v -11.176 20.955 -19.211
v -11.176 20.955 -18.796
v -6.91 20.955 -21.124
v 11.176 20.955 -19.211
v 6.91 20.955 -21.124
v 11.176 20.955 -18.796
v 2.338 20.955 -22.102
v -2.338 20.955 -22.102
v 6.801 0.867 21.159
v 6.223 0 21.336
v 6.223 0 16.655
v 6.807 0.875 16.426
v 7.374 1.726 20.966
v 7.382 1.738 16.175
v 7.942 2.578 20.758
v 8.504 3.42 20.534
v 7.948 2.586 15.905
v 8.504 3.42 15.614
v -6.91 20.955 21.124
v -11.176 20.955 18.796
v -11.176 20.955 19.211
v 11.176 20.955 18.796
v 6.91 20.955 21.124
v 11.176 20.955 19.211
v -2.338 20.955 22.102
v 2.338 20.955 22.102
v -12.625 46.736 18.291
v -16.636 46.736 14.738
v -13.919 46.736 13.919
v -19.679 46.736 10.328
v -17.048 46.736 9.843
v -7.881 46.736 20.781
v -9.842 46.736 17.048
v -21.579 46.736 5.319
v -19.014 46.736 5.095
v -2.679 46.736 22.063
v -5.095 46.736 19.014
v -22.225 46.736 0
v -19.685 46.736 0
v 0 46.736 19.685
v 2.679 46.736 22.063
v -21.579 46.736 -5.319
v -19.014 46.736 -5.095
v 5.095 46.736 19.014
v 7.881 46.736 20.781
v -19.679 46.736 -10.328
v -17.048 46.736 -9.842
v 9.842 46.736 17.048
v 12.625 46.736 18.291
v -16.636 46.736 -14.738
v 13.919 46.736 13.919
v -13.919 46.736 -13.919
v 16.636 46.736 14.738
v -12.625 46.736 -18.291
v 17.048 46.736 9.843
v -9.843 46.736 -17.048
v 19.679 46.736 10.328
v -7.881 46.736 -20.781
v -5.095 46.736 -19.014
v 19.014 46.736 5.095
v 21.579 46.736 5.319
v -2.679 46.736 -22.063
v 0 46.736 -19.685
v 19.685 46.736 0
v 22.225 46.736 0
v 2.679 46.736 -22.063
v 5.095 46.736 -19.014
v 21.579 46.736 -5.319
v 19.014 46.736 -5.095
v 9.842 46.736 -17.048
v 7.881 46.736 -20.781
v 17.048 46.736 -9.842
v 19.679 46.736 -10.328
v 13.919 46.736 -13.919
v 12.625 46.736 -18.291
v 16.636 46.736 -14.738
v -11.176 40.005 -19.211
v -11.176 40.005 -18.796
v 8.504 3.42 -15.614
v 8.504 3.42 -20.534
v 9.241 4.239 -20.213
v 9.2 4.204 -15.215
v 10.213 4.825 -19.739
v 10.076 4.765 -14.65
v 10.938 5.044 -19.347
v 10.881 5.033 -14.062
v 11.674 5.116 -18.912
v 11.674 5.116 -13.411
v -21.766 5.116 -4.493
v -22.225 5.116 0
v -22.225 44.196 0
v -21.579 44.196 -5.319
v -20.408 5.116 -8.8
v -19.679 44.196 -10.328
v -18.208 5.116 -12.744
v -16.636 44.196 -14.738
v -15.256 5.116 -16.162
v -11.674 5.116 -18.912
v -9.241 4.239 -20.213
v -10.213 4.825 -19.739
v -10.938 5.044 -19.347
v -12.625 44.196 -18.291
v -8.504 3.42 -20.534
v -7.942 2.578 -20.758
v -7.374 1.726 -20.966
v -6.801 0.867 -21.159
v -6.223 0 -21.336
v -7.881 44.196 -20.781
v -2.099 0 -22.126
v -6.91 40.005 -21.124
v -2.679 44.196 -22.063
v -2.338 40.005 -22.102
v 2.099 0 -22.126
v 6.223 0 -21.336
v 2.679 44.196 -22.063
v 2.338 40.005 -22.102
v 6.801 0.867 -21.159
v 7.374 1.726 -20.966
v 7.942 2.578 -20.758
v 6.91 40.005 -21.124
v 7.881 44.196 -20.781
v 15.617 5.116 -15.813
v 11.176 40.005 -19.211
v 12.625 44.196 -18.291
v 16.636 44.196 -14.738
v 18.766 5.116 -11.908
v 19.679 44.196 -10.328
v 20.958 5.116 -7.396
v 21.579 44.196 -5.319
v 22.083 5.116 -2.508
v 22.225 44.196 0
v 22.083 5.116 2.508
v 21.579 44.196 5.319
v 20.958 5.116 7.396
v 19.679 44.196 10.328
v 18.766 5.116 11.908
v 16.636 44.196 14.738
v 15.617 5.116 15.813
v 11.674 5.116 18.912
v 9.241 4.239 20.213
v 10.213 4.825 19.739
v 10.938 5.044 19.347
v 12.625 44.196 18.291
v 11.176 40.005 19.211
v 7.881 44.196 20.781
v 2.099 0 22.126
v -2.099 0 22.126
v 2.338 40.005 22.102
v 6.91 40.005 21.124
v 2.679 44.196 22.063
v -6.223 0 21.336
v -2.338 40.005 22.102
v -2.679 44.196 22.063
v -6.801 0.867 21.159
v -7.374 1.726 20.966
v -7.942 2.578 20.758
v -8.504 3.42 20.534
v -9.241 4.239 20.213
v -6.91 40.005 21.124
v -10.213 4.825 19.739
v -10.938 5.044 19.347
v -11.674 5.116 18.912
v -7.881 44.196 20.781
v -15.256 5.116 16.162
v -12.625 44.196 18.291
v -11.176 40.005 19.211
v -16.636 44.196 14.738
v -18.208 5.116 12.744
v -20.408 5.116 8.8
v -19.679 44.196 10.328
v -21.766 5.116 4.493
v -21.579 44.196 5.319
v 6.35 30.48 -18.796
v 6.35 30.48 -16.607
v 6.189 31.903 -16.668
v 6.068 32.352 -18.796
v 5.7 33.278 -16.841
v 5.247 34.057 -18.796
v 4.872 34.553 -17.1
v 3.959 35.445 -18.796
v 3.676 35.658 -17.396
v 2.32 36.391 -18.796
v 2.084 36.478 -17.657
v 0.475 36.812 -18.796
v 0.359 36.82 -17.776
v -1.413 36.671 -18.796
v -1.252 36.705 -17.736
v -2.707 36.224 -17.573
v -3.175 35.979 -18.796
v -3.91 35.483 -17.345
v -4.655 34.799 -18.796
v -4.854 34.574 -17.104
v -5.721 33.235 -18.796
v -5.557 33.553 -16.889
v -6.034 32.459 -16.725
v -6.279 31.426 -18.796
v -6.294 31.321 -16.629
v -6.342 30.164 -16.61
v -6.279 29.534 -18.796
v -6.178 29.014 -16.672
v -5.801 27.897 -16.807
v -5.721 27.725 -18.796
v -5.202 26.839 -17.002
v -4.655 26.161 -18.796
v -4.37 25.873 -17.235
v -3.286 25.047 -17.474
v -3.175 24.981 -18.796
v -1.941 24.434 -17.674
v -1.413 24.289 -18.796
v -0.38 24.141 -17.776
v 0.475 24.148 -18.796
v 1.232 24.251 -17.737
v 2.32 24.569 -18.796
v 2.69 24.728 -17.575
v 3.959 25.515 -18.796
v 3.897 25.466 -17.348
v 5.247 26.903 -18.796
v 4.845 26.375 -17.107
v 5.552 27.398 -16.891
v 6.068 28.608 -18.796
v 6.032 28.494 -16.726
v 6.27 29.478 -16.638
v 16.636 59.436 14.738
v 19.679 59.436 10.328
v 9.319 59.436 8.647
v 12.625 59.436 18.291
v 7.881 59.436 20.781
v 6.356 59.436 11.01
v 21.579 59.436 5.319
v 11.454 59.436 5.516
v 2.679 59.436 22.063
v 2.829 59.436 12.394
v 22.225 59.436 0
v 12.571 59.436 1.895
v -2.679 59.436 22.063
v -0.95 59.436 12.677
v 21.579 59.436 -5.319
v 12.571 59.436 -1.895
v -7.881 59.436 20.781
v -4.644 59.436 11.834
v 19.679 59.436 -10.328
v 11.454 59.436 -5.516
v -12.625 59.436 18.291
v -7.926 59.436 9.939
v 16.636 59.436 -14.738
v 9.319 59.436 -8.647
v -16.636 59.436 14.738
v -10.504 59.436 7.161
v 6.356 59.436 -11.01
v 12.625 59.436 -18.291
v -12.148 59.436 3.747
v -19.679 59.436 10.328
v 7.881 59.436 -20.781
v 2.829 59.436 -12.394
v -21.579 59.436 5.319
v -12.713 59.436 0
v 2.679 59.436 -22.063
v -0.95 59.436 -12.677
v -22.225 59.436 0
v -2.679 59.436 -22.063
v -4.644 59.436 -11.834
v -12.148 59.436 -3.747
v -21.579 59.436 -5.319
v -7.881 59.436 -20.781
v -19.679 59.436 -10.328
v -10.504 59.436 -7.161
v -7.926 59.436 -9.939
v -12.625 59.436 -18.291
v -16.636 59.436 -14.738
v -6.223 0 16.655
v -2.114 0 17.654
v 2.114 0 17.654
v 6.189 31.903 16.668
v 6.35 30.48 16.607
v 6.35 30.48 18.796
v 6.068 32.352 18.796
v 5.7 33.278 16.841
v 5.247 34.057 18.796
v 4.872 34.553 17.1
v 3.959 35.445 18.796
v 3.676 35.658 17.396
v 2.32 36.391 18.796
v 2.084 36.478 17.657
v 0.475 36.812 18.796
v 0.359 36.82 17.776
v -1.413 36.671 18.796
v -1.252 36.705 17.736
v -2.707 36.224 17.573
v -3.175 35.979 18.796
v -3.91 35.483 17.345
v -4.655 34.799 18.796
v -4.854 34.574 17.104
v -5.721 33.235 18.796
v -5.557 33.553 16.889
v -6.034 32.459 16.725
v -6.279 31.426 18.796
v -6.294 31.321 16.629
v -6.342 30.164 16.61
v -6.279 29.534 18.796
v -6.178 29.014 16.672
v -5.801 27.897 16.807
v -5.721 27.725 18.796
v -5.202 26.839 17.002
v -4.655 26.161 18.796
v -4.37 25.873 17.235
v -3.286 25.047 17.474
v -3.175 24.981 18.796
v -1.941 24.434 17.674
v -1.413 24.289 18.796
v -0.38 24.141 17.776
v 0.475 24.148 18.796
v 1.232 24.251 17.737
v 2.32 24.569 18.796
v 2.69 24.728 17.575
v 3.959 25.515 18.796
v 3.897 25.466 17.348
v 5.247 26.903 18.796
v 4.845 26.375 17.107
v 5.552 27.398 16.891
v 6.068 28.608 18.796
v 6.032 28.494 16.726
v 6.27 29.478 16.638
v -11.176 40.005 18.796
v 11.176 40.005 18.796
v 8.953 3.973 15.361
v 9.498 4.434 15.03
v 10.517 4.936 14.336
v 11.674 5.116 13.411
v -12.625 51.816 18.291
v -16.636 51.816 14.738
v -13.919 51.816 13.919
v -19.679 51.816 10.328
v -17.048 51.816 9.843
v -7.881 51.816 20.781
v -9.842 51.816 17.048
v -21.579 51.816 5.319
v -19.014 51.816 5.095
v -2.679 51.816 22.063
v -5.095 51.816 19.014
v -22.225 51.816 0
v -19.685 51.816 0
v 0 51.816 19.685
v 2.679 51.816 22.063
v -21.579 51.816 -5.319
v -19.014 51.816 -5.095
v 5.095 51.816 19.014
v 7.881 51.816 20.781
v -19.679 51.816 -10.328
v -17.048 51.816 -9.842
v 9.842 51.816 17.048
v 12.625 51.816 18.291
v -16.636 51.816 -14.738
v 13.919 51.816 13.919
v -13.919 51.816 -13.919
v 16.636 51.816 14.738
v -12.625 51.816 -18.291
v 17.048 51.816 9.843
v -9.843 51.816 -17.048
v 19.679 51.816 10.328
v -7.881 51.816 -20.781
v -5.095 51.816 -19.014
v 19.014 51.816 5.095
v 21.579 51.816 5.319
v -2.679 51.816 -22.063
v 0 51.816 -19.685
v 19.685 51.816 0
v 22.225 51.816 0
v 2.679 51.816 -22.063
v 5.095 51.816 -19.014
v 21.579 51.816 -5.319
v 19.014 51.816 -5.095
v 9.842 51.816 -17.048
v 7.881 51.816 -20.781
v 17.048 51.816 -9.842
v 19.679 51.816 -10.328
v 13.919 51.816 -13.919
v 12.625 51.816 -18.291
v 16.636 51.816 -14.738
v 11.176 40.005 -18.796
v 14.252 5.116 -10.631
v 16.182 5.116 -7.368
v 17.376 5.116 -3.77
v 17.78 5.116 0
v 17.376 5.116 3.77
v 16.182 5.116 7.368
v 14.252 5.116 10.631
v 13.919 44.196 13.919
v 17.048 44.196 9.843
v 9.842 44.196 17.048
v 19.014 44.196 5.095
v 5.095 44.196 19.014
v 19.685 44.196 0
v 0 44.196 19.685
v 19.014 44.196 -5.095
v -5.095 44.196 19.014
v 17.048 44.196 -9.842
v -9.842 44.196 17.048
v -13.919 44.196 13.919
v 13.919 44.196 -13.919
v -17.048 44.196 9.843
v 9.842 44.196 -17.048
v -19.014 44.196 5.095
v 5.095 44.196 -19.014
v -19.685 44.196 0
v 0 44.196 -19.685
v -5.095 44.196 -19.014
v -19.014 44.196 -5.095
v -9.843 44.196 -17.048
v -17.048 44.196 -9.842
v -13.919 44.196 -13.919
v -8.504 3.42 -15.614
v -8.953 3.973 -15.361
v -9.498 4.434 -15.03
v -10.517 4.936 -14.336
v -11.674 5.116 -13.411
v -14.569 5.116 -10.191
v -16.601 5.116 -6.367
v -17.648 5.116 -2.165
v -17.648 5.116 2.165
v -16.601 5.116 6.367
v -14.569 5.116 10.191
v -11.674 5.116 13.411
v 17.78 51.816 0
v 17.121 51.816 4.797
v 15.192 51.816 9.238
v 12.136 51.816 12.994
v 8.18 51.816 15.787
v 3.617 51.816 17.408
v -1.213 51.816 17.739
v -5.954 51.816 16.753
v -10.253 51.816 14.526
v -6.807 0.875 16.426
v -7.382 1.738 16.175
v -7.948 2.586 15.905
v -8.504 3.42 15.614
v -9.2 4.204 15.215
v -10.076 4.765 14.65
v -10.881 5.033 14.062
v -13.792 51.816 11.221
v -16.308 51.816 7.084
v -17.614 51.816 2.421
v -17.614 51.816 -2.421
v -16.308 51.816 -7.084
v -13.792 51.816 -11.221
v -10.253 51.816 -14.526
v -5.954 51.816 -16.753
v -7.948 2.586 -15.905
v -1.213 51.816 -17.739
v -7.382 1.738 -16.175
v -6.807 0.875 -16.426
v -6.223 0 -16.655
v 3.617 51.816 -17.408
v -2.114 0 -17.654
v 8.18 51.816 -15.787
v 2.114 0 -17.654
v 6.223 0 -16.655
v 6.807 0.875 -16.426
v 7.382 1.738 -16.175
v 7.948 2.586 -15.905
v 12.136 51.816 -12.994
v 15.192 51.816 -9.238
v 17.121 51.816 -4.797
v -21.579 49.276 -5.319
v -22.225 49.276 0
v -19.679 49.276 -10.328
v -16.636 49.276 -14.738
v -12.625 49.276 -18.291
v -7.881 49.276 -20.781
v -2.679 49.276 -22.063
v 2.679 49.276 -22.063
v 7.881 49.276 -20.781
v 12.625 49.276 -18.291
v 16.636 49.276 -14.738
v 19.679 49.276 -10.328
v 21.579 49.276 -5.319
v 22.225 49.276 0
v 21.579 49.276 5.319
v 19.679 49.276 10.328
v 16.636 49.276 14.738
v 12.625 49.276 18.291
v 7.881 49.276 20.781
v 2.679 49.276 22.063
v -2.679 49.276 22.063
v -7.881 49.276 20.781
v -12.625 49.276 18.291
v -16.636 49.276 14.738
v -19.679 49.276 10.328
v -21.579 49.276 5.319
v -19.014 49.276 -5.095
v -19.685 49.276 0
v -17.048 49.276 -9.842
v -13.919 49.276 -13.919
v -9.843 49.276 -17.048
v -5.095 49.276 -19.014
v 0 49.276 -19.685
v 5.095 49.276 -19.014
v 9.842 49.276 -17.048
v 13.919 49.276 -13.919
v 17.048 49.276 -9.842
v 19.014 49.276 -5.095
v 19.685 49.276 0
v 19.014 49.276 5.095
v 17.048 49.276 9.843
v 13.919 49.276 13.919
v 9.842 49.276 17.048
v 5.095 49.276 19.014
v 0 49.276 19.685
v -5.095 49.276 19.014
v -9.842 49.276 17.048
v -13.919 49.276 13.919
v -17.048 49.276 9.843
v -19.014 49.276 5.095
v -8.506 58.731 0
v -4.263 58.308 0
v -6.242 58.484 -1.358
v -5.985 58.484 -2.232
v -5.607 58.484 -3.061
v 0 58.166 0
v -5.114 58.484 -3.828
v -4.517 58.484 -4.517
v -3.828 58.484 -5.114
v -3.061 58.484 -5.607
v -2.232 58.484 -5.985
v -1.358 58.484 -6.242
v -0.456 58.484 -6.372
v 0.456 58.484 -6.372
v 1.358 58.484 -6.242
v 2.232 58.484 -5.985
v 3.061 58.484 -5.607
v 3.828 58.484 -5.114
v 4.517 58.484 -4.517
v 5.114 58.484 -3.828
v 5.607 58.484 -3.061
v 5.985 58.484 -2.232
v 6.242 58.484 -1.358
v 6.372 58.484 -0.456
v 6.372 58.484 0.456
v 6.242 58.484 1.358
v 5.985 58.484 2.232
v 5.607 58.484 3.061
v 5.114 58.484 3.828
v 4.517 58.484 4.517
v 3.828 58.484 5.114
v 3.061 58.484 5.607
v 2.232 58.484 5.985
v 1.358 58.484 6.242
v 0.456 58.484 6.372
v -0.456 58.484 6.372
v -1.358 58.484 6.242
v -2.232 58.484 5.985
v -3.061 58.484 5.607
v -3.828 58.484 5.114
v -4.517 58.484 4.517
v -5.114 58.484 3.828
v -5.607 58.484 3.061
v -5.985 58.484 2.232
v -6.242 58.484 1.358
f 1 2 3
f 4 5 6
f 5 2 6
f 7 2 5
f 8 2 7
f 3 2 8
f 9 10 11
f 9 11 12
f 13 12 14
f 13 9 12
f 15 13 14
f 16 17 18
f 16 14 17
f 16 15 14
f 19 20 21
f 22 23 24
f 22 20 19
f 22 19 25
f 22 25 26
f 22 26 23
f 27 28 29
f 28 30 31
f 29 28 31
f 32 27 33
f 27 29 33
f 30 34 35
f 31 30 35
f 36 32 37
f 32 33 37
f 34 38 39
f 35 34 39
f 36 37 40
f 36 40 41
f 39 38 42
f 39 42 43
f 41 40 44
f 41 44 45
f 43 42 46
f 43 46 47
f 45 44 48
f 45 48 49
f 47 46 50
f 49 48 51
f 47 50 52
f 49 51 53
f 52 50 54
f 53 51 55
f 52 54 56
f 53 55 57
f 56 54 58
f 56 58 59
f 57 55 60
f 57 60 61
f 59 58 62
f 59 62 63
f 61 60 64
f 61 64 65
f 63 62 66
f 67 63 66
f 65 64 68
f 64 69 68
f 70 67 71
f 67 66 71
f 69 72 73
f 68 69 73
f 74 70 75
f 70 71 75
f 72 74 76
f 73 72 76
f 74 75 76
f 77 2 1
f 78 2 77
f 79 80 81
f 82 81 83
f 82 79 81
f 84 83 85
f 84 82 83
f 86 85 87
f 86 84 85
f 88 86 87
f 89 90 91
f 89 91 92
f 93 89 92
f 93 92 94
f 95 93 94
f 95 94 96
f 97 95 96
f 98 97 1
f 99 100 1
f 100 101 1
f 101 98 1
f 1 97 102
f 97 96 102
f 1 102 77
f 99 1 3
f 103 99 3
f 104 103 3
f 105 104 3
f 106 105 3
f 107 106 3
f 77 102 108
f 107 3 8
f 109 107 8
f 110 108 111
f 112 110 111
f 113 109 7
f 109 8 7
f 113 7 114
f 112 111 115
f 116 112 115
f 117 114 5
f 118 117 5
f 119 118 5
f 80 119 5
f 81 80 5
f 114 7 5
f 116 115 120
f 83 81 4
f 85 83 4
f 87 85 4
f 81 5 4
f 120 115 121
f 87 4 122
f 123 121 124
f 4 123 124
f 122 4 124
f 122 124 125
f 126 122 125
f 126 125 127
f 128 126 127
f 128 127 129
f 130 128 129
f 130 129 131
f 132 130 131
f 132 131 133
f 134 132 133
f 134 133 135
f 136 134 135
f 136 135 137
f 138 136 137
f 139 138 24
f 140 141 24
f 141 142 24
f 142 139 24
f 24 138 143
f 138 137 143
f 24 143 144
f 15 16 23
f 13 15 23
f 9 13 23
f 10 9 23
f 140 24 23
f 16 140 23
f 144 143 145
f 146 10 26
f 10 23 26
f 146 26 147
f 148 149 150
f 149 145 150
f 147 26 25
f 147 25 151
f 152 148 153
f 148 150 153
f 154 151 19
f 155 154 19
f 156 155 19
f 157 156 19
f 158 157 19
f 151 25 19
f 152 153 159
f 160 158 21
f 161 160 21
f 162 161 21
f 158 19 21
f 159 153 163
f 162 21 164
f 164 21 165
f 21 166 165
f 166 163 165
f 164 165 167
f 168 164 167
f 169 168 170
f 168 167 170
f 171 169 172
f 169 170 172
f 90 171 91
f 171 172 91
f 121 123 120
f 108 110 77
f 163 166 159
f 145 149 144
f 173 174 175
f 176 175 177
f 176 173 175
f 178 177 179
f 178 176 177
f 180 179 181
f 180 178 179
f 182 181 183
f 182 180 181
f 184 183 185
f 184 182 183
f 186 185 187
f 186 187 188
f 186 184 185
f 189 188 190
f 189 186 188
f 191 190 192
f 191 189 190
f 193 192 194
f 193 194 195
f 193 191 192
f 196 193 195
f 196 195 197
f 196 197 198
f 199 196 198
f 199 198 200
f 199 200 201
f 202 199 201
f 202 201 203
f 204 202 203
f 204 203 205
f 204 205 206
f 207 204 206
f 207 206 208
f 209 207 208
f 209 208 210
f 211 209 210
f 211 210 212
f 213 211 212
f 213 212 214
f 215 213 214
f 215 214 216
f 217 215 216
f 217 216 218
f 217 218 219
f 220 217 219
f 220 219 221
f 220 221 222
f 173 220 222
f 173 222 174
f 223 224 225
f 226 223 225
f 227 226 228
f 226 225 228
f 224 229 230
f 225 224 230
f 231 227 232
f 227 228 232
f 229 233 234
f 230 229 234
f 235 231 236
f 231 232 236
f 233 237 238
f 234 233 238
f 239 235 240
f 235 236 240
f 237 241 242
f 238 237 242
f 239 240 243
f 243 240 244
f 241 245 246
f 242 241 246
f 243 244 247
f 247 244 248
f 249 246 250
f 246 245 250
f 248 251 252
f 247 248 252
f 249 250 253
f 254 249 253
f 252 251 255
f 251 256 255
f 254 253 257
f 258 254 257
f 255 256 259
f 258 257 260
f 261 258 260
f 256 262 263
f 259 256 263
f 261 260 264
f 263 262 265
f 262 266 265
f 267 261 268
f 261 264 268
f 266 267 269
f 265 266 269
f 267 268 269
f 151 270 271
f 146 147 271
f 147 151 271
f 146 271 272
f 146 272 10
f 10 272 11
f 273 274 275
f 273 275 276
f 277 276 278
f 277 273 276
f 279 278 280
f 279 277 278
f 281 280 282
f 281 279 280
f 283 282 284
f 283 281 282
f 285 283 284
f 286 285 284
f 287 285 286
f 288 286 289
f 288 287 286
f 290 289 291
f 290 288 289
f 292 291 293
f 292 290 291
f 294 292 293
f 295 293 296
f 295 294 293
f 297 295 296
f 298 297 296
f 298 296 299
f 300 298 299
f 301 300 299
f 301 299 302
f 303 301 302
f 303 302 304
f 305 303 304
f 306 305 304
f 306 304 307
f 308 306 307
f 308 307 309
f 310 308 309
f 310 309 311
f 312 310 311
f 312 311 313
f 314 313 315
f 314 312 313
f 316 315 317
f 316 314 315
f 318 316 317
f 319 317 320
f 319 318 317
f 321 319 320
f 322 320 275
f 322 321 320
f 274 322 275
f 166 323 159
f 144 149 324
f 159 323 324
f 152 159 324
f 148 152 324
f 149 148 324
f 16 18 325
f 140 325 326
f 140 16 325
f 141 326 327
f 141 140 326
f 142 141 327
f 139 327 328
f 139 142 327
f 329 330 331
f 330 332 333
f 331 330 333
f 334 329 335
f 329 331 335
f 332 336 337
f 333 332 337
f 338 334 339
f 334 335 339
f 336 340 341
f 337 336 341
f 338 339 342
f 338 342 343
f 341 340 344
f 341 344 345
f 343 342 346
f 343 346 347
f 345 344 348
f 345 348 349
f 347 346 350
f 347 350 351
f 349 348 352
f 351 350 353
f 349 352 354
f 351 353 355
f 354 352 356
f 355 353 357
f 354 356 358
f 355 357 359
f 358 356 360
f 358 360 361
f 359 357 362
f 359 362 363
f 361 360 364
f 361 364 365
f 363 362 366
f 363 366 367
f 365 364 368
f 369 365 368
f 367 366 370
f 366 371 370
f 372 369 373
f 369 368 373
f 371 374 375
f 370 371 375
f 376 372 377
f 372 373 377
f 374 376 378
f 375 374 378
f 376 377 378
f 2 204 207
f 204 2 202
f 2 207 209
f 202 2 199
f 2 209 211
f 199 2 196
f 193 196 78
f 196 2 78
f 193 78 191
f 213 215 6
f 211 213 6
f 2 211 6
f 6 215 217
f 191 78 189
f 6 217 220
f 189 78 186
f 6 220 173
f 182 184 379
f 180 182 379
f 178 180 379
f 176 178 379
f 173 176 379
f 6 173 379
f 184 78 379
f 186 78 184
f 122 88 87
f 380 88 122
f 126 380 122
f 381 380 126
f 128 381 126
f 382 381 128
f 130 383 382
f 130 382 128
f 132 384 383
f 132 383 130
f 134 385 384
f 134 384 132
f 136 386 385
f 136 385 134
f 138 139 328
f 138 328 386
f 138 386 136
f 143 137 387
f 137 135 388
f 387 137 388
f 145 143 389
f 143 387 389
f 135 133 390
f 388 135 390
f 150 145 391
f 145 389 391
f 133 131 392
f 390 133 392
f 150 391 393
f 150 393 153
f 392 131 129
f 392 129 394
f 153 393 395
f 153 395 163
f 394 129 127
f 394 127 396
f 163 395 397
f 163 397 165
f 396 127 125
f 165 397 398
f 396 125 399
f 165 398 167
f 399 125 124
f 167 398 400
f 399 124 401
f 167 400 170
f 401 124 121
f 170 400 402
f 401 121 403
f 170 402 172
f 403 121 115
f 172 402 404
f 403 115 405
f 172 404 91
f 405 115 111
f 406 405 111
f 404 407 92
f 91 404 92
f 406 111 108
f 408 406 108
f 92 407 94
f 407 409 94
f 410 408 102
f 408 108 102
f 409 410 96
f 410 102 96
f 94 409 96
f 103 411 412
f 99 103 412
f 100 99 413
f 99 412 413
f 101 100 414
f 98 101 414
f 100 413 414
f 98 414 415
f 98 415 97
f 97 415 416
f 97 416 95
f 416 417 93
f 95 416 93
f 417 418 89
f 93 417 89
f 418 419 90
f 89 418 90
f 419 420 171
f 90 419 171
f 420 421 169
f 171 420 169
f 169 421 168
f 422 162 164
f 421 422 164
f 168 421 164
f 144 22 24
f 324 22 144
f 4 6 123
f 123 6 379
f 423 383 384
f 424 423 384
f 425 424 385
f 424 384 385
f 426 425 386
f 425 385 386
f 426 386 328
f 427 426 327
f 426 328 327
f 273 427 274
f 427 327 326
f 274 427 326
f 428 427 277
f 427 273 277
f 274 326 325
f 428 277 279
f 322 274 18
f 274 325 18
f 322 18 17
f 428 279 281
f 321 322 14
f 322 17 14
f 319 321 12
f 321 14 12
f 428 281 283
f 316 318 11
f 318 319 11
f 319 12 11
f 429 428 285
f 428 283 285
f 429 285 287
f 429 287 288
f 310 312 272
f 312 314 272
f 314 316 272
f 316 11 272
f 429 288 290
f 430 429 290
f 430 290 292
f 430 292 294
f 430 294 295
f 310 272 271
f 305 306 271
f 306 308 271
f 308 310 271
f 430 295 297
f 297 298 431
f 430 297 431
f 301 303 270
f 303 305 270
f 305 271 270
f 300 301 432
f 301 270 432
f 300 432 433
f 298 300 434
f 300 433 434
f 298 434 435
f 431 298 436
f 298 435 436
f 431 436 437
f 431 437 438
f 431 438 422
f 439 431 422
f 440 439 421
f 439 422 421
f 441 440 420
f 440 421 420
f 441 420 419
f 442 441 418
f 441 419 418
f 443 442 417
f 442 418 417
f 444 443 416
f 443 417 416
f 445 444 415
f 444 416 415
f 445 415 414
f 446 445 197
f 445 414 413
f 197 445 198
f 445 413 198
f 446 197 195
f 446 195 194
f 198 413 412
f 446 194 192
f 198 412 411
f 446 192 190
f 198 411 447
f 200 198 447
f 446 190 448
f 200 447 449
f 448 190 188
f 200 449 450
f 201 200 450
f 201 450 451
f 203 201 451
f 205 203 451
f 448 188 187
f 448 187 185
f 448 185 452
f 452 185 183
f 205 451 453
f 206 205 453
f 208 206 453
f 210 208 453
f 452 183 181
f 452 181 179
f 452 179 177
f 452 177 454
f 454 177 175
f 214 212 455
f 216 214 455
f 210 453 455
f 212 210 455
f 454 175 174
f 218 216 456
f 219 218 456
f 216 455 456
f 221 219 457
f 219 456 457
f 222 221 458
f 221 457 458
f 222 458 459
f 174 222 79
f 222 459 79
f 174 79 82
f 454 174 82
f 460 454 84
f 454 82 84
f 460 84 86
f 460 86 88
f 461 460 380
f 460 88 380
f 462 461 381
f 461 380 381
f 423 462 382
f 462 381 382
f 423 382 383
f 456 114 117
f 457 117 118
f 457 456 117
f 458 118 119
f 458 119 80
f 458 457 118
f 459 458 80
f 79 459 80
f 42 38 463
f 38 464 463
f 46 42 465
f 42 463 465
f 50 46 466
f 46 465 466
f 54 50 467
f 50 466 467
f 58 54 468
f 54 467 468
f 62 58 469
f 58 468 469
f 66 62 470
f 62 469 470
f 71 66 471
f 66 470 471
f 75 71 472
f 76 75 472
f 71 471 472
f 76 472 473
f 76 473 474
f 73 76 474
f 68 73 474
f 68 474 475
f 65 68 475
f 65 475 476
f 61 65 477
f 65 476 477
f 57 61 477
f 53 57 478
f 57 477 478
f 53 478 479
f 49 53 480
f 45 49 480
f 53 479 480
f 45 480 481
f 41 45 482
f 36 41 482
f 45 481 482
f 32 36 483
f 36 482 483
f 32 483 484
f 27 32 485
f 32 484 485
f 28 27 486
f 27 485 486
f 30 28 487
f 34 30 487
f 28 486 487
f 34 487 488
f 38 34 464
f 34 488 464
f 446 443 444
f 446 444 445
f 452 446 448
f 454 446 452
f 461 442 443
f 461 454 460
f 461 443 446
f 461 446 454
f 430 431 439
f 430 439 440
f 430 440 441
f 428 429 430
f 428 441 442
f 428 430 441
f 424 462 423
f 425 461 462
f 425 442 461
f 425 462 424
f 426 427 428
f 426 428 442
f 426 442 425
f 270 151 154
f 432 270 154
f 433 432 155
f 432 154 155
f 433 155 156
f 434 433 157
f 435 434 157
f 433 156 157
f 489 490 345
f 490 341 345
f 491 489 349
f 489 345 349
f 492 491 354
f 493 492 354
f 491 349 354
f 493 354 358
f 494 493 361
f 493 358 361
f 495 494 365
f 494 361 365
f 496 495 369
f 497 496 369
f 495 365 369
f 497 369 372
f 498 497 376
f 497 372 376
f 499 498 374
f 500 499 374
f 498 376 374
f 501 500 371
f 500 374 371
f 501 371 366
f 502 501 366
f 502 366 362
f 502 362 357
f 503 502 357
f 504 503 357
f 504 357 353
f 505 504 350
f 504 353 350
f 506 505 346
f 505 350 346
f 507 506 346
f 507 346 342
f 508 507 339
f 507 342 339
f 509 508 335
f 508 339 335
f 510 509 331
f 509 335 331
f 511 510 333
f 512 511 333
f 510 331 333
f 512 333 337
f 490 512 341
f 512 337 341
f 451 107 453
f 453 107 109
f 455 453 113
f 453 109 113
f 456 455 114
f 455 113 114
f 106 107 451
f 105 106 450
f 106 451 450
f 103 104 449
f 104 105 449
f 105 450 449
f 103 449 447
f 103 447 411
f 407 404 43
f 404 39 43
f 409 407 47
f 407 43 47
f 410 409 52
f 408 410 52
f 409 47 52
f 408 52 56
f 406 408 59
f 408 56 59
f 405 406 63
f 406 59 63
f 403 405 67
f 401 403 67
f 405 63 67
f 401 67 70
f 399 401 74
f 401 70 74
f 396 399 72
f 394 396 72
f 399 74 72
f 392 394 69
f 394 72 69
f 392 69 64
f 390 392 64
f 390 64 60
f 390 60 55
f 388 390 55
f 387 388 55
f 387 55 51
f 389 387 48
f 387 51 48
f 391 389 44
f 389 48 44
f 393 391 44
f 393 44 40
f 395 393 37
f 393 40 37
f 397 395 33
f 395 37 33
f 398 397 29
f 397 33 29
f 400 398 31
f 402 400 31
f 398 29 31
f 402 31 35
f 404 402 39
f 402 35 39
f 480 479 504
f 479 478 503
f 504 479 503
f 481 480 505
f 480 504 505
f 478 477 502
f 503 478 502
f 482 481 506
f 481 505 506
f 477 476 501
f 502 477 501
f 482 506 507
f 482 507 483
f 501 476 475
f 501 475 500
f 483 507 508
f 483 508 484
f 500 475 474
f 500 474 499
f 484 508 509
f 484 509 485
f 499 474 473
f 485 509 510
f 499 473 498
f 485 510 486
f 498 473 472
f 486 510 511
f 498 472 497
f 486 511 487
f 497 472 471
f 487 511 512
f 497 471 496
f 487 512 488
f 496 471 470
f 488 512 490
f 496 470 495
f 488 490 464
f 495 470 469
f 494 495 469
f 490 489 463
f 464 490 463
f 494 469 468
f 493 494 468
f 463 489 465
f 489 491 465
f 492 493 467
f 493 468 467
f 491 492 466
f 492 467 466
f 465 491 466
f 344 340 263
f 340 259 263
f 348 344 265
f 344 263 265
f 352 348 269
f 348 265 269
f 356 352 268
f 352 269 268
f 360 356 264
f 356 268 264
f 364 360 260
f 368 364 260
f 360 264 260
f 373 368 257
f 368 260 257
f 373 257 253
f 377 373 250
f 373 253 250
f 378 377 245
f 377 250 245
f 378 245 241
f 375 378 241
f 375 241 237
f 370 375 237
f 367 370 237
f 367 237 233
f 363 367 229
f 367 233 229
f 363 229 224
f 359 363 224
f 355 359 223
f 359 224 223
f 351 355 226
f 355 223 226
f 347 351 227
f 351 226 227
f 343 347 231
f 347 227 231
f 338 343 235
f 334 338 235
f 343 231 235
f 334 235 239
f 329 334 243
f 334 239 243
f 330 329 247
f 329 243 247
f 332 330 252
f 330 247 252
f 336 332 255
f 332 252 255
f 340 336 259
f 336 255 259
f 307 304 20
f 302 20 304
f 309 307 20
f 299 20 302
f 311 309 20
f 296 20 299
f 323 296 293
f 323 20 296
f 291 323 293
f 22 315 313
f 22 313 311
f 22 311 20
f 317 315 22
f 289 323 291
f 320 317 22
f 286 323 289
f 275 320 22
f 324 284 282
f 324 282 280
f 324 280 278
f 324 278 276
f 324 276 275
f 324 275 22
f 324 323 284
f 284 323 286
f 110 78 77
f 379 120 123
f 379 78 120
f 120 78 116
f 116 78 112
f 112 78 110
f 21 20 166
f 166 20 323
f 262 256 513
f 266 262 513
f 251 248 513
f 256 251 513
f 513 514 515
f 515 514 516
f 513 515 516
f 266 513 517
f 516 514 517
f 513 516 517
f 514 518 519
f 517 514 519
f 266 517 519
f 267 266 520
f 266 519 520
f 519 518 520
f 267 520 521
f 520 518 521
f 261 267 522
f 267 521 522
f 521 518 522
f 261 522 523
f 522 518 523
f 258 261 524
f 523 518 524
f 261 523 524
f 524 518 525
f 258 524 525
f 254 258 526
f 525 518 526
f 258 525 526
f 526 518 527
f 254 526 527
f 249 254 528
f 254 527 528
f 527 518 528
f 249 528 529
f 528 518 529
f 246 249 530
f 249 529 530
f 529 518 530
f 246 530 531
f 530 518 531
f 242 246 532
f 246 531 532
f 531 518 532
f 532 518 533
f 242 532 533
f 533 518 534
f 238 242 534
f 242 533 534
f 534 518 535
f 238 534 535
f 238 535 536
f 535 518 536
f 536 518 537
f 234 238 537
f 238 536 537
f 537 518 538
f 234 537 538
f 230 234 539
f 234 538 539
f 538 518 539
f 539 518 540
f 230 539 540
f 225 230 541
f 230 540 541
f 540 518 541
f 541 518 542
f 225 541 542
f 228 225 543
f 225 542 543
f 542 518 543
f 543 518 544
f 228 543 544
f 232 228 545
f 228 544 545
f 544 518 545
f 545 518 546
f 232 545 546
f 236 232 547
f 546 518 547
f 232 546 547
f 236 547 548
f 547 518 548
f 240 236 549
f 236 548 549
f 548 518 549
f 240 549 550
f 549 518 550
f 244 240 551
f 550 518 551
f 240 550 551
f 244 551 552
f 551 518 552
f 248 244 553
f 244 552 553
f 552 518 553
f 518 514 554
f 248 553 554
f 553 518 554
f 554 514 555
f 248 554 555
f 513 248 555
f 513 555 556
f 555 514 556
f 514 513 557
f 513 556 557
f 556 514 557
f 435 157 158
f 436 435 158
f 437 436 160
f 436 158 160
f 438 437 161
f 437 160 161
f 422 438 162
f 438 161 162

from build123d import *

# Parameters (mm, degrees)
SKETCH2_R               = 17.78
CUT_EXTRUDE1_DEPTH      = 51.816
CUT_EXTRUDE2_DEPTH      = 68.23495628
CUT_EXTRUDE2_DEPTH_BACK = 68.23495628
SKETCH3_R               = 6.35
CUT_EXTRUDE3_START      = -18.796
SKETCH4_W               = 22.352
SKETCH4_H               = 19.05
CUT_EXTRUDE3_DEPTH      = 49.438956346
CUT_EXTRUDE4_DEPTH      = 68.23495628


with BuildPart() as part:
    # Sketch1 → Revolve1 (revolve)
    with BuildSketch(Plane.XY, mode=Mode.PRIVATE) as revolve1_sk:
        with BuildLine():
            Line((0, 0), (22.225, 0))
            Line((22.225, 0), (22.225, 44.196))
            Line((22.225, 44.196), (19.685, 44.196))
            Line((19.685, 44.196), (19.685, 46.736))
            Line((19.685, 46.736), (22.225, 46.736))
            Line((22.225, 46.736), (22.225, 49.276))
            Line((22.225, 49.276), (19.685, 49.276))
            Line((19.685, 49.276), (19.685, 51.816))
            Line((19.685, 51.816), (22.225, 51.816))
            Line((22.225, 51.816), (22.225, 59.436))
            Line((22.225, 59.436), (12.712693656, 59.436))
            ThreePointArc((12.712693656, 59.436), (6.387986381, 58.484288237), (0, 58.166))
            Line((0, 58.166), (0, 0))
        make_face()
    revolve(revolve1_sk.sketch.rotate(Axis((0, 58.166, 0), (0, -1, 0)), 180), axis=Axis((0, 58.166, 0), (0, -1, 0)))

    # Sketch2 → Cut-Extrude1 (cut)
    with BuildSketch(Plane.XZ):
        Circle(SKETCH2_R)
    extrude(amount=-CUT_EXTRUDE1_DEPTH, mode=Mode.SUBTRACT)

    # Sketch3 → Cut-Extrude2 (cut, two sides: drawn at the far end of the back side and taken through both)
    with BuildSketch(Plane.XY.offset(-CUT_EXTRUDE2_DEPTH_BACK)):
        with Locations((0, 30.48)):
            Circle(SKETCH3_R)
    extrude(amount=CUT_EXTRUDE2_DEPTH + CUT_EXTRUDE2_DEPTH_BACK, mode=Mode.SUBTRACT)

    # Sketch4 → Cut-Extrude3 (cut, through all)
    with BuildSketch(Plane.XY.offset(CUT_EXTRUDE3_START)):
        with Locations((0, 30.48)):
            Rectangle(SKETCH4_W, SKETCH4_H)
    cut_extrude3 = extrude(amount=-CUT_EXTRUDE3_DEPTH, mode=Mode.SUBTRACT)

    # Mirror1: Cut-Extrude3 across plane
    add(cut_extrude3.mirror(Plane.XY), mode=Mode.SUBTRACT)

    # Sketch5 → Cut-Extrude4 (cut, symmetric)
    with BuildSketch(Plane.XY):
        with BuildLine():
            Line((6.223, 0), (8.503897348, 3.420061294))
            ThreePointArc((8.503897348, 3.420061294), (9.876155028, 4.665440061), (11.673642553, 5.116104025))
            Line((11.673642553, 5.116104025), (22.225, 5.116104025))
            Line((22.225, 5.116104025), (22.225, 0))
            Line((22.225, 0), (6.223, 0))
        make_face()
    cut_extrude4 = extrude(amount=CUT_EXTRUDE4_DEPTH, both=True, mode=Mode.SUBTRACT)

    # Mirror2: Cut-Extrude4 across plane
    add(cut_extrude4.mirror(Plane(origin=(0, 0, 0), x_dir=(0, 0, 1), z_dir=(1, 0, 0))), mode=Mode.SUBTRACT)


solid = part.part
